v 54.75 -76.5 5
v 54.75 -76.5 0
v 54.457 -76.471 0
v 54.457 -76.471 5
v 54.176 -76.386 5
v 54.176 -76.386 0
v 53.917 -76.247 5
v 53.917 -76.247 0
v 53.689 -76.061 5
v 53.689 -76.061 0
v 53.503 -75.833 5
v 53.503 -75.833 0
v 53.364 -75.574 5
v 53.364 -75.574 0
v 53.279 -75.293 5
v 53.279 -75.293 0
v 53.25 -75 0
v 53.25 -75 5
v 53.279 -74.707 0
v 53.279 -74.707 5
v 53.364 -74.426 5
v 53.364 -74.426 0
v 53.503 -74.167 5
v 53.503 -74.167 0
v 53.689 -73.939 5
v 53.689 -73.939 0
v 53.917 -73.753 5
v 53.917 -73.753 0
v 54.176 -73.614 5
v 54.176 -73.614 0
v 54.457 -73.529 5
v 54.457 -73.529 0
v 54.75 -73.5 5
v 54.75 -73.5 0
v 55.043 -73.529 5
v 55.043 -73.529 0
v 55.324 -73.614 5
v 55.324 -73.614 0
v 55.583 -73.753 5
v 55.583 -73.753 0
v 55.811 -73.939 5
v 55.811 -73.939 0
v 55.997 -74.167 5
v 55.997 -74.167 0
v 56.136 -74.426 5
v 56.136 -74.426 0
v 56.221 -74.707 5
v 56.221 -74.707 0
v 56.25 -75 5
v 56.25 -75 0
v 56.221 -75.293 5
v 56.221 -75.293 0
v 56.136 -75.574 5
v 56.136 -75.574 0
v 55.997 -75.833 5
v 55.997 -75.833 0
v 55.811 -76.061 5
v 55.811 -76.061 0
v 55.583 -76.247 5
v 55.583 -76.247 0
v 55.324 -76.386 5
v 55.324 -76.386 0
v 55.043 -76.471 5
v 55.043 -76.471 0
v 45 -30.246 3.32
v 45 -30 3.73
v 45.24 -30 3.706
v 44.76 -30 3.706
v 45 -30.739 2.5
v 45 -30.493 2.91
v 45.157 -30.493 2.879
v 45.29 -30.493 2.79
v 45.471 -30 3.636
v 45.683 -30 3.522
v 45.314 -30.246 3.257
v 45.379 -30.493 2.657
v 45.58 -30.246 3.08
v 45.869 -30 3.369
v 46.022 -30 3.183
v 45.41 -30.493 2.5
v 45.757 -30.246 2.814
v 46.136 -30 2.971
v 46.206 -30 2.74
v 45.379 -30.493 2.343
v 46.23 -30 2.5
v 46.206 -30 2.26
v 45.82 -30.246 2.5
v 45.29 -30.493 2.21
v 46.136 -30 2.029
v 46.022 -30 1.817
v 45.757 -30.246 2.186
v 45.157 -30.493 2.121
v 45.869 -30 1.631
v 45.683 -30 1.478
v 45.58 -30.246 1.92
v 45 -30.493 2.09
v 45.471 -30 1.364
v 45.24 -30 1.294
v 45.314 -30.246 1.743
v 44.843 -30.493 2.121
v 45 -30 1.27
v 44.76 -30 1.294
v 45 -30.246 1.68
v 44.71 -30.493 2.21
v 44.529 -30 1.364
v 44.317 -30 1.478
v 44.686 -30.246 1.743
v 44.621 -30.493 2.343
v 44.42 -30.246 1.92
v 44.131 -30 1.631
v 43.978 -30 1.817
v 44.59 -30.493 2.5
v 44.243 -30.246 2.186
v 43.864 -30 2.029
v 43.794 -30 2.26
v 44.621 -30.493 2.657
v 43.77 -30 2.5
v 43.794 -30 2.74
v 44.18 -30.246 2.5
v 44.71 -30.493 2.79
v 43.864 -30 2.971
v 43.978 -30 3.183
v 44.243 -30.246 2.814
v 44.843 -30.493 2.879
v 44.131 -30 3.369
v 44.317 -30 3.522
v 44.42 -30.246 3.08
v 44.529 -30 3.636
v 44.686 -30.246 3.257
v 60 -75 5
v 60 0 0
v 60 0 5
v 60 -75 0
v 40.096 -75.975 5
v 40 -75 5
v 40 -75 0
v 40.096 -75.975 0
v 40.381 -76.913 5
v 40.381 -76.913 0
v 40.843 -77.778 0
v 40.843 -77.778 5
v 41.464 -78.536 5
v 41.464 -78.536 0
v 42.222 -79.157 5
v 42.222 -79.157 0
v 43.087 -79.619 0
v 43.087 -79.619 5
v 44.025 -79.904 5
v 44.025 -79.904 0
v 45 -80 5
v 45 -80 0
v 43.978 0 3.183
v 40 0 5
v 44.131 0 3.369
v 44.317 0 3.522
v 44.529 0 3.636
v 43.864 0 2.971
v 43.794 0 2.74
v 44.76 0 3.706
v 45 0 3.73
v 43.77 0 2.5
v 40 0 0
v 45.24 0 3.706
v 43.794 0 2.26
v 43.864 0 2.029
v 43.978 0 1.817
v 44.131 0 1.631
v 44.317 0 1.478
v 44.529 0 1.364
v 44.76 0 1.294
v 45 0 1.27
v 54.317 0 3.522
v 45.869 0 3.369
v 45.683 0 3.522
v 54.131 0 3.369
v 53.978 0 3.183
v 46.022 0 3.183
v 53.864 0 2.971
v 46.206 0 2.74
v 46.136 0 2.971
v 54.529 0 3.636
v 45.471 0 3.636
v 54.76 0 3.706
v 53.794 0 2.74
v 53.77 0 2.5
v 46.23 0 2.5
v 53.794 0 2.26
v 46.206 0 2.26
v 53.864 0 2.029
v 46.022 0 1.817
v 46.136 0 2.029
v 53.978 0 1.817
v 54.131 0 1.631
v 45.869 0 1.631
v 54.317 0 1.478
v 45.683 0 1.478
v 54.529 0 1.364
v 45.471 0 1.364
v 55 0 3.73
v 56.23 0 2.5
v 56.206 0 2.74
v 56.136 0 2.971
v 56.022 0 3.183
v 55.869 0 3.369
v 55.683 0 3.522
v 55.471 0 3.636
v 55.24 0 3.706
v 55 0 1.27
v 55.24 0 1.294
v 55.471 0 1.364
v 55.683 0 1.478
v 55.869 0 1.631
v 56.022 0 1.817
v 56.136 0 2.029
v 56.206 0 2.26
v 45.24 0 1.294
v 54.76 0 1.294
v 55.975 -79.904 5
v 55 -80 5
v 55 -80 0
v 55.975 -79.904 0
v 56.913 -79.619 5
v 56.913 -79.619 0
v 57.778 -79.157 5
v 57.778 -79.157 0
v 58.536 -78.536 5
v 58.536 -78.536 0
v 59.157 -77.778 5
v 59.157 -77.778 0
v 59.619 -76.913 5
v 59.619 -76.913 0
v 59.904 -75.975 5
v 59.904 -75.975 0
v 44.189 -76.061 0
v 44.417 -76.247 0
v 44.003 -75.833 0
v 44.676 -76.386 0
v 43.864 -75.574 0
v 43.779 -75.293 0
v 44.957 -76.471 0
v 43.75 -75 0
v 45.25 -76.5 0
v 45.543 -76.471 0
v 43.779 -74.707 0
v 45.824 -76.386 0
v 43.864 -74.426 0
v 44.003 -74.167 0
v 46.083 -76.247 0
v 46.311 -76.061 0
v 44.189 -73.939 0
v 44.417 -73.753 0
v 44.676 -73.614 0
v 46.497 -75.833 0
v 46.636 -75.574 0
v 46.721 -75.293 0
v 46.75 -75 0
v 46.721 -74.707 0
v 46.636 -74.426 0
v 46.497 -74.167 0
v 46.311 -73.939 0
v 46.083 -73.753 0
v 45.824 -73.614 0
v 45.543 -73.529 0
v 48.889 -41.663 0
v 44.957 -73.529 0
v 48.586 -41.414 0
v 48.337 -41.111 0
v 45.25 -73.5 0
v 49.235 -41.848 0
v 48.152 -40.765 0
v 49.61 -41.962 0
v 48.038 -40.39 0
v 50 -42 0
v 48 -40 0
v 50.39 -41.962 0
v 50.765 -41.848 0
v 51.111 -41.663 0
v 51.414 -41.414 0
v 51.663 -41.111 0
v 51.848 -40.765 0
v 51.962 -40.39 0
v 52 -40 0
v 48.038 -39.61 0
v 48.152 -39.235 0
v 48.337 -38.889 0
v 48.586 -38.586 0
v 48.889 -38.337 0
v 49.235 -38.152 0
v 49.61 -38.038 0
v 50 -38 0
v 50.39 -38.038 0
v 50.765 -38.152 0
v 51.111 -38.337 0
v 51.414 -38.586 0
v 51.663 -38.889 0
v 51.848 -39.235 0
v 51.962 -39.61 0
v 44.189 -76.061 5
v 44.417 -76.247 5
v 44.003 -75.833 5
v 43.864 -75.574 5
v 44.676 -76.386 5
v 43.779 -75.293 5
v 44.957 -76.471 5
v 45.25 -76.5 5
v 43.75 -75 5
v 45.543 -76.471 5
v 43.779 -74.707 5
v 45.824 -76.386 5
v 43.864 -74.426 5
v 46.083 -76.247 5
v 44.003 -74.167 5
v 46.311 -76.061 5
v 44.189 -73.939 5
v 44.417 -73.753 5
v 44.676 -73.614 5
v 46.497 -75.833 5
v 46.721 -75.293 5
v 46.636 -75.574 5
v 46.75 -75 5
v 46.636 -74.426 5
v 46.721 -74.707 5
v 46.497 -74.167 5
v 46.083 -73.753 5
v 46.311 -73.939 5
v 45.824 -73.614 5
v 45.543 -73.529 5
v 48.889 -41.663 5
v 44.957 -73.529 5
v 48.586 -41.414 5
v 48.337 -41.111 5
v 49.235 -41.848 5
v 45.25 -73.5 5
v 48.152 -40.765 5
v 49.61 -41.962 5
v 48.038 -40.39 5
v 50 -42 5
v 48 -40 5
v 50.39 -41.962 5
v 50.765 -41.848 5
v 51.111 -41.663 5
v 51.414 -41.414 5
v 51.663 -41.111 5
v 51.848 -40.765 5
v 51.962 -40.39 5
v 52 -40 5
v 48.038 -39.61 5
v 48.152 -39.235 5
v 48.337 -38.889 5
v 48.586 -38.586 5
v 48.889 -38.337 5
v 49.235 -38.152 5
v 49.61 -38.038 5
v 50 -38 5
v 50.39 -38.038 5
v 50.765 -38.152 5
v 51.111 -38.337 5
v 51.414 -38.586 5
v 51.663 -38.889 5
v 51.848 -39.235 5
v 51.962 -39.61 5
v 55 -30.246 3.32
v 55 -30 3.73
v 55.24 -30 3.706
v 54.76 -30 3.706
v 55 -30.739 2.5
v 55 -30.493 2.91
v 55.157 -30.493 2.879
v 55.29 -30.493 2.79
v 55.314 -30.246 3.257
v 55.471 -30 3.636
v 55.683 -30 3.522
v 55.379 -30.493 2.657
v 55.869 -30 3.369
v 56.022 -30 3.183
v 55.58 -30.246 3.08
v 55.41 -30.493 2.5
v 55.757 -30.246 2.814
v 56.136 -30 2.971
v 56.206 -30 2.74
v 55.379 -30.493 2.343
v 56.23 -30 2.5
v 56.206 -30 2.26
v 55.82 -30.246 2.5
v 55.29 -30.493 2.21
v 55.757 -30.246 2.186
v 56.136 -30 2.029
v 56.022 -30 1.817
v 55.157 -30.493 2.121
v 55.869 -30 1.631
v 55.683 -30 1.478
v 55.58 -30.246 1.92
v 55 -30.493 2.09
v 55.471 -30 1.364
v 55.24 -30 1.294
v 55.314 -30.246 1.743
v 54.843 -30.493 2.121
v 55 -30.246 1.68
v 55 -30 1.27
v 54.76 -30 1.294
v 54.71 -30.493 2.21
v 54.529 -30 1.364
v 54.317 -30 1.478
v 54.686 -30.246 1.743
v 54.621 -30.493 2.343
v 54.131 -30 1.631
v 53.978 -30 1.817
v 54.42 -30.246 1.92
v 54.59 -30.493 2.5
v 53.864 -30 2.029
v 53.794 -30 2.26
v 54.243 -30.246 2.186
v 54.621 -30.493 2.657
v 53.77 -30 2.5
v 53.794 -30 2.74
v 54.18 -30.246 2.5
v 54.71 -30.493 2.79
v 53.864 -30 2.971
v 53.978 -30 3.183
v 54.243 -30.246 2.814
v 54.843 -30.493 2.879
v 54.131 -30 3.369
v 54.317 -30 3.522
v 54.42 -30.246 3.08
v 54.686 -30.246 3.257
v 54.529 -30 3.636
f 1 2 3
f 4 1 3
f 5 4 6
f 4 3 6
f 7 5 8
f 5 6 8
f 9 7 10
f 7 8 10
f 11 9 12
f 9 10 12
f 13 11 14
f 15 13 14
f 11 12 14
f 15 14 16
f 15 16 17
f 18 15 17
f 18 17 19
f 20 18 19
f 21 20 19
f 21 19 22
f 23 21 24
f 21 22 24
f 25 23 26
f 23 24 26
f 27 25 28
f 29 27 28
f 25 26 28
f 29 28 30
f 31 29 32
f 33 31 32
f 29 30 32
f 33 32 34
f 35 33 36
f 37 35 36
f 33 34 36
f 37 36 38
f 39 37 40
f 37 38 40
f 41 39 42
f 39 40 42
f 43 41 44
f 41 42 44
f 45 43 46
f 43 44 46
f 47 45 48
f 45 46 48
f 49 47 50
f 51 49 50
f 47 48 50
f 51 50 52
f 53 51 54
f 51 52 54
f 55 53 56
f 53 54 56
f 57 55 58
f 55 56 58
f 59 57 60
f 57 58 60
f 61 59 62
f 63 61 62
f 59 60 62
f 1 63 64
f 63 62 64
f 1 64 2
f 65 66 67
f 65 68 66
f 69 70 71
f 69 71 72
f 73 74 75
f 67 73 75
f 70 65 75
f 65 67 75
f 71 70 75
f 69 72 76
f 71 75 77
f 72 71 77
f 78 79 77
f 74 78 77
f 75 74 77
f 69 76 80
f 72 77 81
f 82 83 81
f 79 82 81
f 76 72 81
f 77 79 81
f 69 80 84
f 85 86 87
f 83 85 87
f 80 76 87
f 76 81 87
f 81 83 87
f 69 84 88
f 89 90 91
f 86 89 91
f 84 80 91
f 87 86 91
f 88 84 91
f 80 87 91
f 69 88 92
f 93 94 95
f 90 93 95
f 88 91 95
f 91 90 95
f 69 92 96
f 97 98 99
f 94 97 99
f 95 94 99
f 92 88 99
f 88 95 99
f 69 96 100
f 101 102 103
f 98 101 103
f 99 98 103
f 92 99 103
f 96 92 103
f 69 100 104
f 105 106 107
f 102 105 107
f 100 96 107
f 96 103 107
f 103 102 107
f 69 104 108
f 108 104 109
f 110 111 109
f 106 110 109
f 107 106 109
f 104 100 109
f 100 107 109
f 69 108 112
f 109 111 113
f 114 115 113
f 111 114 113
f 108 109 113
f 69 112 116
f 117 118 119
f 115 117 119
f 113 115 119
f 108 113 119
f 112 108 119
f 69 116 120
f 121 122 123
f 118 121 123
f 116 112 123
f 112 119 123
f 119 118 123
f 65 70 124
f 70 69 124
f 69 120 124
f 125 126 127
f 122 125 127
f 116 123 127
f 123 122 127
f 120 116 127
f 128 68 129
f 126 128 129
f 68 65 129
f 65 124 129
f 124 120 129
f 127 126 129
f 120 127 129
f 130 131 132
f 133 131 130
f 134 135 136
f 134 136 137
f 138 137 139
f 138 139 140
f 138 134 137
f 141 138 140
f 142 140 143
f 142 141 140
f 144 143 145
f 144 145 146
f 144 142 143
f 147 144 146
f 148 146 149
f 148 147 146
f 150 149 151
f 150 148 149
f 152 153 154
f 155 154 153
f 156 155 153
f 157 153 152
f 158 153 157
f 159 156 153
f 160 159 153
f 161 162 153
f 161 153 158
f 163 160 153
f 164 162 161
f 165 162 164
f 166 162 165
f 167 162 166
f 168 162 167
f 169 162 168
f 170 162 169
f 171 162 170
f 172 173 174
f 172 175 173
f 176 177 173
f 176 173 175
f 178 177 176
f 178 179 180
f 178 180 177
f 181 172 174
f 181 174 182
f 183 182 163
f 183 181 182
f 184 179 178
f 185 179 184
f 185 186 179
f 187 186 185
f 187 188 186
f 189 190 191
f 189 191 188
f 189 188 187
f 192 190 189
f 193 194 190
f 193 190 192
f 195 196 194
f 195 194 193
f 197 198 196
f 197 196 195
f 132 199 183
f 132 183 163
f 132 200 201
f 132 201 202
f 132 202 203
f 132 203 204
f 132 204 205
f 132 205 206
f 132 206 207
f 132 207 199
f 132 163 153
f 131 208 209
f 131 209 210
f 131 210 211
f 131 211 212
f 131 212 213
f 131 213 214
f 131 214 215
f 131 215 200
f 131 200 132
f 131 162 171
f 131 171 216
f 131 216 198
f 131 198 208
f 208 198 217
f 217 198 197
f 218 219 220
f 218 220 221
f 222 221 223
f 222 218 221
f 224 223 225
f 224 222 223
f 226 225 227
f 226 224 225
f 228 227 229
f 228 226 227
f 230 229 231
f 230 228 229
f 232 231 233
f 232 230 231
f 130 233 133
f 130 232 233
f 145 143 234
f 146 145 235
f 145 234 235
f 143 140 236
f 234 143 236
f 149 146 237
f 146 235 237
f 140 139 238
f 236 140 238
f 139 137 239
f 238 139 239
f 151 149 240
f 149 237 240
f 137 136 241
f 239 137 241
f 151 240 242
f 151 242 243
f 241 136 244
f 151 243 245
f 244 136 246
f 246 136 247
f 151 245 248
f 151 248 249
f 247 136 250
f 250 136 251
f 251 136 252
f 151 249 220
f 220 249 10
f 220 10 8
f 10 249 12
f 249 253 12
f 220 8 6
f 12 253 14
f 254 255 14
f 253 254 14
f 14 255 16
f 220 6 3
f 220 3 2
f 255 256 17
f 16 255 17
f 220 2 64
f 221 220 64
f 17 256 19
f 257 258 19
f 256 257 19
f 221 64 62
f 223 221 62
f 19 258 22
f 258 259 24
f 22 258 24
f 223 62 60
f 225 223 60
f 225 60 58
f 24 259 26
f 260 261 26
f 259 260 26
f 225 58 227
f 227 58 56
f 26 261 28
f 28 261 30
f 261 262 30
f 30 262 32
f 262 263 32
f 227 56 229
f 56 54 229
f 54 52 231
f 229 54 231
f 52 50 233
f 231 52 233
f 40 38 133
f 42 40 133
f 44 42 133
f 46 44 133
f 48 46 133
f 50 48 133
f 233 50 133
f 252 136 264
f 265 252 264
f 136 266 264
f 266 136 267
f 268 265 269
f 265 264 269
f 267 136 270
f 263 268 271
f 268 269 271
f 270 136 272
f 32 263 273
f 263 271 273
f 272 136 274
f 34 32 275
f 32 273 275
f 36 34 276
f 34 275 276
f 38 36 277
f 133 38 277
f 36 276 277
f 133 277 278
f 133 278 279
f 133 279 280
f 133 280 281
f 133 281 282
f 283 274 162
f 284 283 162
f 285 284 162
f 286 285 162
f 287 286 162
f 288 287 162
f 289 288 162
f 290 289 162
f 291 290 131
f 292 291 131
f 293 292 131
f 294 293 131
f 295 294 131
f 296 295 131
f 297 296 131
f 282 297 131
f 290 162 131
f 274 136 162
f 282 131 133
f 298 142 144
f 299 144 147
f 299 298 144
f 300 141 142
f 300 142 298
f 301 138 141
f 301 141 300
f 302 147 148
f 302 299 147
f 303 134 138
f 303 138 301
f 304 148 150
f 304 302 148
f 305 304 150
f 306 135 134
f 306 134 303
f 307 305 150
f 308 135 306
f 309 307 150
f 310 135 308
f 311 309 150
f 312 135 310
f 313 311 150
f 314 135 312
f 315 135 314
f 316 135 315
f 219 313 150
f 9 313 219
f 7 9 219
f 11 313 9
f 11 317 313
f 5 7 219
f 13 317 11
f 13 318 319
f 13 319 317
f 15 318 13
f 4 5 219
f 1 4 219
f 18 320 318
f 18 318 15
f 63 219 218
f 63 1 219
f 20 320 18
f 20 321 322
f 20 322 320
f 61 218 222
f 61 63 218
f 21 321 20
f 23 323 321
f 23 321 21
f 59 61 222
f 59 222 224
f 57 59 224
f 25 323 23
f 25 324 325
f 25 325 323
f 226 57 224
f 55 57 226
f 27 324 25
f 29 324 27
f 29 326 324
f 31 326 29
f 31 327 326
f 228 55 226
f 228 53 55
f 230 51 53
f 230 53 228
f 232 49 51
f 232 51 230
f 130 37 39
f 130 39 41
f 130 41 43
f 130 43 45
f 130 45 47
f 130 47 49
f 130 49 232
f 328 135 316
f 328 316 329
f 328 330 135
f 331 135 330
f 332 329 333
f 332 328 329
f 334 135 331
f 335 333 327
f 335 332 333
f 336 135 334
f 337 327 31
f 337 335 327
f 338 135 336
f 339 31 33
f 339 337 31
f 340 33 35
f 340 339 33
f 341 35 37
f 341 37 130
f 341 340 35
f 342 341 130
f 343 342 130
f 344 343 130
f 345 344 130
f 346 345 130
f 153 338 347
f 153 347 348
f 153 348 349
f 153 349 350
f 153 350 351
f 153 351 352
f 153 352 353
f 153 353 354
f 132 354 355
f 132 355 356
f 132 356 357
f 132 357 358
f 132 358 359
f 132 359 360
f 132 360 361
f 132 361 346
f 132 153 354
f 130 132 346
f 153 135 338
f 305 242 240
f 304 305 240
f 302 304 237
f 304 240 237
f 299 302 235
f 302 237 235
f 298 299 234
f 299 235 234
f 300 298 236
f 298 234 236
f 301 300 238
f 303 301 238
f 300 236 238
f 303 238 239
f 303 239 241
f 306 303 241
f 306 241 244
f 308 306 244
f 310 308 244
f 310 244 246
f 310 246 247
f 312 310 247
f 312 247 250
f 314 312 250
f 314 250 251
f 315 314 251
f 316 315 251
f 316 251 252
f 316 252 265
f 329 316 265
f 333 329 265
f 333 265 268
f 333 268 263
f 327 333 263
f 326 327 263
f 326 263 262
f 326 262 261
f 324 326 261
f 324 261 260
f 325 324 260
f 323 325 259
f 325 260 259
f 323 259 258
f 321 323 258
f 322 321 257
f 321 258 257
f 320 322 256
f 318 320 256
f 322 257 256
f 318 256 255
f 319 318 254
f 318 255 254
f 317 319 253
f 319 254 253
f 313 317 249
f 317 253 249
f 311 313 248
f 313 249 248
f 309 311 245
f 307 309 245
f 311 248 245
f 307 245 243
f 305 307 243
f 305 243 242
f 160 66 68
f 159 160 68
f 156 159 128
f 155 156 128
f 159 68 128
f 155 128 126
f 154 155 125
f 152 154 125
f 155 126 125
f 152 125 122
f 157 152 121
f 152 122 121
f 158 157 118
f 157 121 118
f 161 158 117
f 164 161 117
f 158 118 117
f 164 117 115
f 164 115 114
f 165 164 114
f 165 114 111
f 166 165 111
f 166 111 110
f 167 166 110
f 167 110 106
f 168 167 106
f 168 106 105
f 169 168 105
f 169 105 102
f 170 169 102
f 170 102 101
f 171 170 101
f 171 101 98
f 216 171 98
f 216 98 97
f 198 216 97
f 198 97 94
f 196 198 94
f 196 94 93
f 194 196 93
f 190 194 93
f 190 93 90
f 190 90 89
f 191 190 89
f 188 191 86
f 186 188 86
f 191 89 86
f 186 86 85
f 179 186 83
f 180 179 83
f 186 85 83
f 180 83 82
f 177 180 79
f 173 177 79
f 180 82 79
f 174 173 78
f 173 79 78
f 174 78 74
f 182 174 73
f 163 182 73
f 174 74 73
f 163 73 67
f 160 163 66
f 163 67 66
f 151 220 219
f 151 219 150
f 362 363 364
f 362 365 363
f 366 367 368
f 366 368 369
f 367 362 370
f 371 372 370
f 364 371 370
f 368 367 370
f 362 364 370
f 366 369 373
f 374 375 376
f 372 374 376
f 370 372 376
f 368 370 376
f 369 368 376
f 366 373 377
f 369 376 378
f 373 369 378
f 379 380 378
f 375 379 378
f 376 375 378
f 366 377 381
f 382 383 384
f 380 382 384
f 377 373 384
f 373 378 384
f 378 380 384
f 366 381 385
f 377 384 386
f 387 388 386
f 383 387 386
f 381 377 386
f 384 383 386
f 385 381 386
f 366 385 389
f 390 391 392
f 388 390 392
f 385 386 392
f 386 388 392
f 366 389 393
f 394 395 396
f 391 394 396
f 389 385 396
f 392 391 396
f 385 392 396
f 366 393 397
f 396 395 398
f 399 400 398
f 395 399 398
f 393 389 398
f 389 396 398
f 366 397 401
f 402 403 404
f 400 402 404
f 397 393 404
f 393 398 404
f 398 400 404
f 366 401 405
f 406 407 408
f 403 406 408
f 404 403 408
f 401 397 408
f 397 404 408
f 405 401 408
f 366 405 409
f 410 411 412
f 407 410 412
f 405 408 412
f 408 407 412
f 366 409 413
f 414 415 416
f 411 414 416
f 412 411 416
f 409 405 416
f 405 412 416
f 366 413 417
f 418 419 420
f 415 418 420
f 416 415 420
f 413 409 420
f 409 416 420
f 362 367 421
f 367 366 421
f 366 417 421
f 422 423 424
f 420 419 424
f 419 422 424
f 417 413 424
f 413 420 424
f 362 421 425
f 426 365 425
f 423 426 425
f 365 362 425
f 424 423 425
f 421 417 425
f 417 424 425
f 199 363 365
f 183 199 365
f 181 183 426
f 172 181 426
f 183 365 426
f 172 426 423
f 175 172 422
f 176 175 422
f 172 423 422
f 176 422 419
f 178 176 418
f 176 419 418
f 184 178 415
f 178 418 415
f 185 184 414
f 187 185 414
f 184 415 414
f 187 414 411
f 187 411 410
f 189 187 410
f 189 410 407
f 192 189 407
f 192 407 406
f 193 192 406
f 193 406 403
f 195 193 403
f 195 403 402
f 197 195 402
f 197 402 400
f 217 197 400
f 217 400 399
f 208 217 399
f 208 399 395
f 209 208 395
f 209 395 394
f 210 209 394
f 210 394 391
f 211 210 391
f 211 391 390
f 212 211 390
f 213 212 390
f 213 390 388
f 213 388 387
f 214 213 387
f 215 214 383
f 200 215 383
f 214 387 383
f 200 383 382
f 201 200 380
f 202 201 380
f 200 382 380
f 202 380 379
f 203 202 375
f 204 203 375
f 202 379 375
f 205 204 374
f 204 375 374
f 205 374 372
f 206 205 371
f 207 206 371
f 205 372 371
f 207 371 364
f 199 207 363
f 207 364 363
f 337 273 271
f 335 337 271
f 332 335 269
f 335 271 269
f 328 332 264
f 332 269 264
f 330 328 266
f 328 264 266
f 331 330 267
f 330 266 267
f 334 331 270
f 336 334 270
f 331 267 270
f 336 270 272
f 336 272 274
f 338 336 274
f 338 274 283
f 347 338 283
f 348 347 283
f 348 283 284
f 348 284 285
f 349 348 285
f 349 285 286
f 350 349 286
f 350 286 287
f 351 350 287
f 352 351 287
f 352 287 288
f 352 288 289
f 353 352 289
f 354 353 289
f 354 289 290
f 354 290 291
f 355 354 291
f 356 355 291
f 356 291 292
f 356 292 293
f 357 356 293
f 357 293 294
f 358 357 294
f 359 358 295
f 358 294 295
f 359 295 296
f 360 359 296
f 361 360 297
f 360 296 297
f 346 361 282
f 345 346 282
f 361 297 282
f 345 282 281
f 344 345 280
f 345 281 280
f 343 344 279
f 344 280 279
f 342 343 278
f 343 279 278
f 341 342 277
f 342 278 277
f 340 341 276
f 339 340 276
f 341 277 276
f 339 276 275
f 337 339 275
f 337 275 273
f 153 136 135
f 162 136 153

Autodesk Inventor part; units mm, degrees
ref_plane "YZ Plane" through (0, 0, 0) normal (1, 0, 0) x (0, 1, 0)
ref_plane "XZ Plane" through (0, 0, 0) normal (0, 1, 0) x (-1, 0, 0)
ref_plane "XY Plane" through (0, 0, 0) normal (0, 0, 1) x (1, 0, 0)
sketch "Sketch1" plane through (0, 0, 0) normal (0, 0, 1) x (1, 0, 0)
  line L0 (40, 0) -> (60, 0)
  line L1 (60, 0) -> (60, -80)
  line L2 (60, -80) -> (40, -80)
  line L3 (40, -80) -> (40, 0)
  point P0 (0, 0)
  dimension "d0" = 40
  dimension "d1" = 20
  dimension "d2" = 80
extrude "Extrusion1" add sketch "Sketch1" along normal blind 5
sketch "Sketch2" plane through (0, 0, 5) normal (0, 0, 1) x (1, 0, 0)
  circle A0 centre (45.25, -75) radius 1.5
  circle A1 centre (54.75, -75) radius 1.5
  line L0 (40, -80) -> (60, -80) projected
  line L1 (60, -80) -> (60, 0) projected
  point P0 (0, 0)
  dimension "d5" = 9.5
  dimension "d6" = 5
  dimension "d7" = 5
  dimension "d8" = 5.25
  dimension "d9" = 3
  dimension "d10" = 3
hole "Hole1" at (45.25, -75, 5) at (54.75, -75, 5) direction (0, 0, -1) diameter 3 depth 20 tip angle 118
fillet "Fillet1" radius 5 2 edges at (40, -80, 2.5) (60, -80, 2.5)
sketch "Sketch4" plane through (0, 0, 5) normal (0, 0, 1) x (1, 0, 0)
  circle A0 centre (50, -40) radius 2
  line L0 (40, 0) -> (40, -75) projected
  line L1 (60, 0) -> (40, 0) projected
  line L2 (45, -80) -> (55, -80) projected
  point P0 (0, 0)
  point P1 (40, -73.521)
  dimension "d32" = 4
  dimension "d33" = 10
  dimension "d34" = 40
  dimension "d42" = 80
hole "Hole3" at (50, -40, 5) direction (0, 0, -1) diameter 4 depth 20 tip angle 118
sketch "Sketch6" plane through (40, 0, 0) normal (0, 1, 0) x (1, 0, 0)
  line L0 (5, 0) -> (5, -5) projected
  circle A0 centre (5, -2.5) radius 1.5
  line L1 (15, -5) -> (15, 0) projected
  circle A1 centre (15, -2.5) radius 1.5513
  point P0 (-40, 0)
  dimension "d50" = 3.1027
  dimension "d51" = 3
hole "Hole5" at (45, 0, 2.5) at (55, 0, 2.5) direction (0, -1, 0) diameter 2.459 depth 30 tip angle 118 thread size "M3x0.5" class "6H" standard "ISO Metric profile"
equation "\"d11\" = d9"
equation "\"d34\" = 0.5 * d42"
equation "\"d35\" = d32"
properties part number "Z-Endstophalter2"
